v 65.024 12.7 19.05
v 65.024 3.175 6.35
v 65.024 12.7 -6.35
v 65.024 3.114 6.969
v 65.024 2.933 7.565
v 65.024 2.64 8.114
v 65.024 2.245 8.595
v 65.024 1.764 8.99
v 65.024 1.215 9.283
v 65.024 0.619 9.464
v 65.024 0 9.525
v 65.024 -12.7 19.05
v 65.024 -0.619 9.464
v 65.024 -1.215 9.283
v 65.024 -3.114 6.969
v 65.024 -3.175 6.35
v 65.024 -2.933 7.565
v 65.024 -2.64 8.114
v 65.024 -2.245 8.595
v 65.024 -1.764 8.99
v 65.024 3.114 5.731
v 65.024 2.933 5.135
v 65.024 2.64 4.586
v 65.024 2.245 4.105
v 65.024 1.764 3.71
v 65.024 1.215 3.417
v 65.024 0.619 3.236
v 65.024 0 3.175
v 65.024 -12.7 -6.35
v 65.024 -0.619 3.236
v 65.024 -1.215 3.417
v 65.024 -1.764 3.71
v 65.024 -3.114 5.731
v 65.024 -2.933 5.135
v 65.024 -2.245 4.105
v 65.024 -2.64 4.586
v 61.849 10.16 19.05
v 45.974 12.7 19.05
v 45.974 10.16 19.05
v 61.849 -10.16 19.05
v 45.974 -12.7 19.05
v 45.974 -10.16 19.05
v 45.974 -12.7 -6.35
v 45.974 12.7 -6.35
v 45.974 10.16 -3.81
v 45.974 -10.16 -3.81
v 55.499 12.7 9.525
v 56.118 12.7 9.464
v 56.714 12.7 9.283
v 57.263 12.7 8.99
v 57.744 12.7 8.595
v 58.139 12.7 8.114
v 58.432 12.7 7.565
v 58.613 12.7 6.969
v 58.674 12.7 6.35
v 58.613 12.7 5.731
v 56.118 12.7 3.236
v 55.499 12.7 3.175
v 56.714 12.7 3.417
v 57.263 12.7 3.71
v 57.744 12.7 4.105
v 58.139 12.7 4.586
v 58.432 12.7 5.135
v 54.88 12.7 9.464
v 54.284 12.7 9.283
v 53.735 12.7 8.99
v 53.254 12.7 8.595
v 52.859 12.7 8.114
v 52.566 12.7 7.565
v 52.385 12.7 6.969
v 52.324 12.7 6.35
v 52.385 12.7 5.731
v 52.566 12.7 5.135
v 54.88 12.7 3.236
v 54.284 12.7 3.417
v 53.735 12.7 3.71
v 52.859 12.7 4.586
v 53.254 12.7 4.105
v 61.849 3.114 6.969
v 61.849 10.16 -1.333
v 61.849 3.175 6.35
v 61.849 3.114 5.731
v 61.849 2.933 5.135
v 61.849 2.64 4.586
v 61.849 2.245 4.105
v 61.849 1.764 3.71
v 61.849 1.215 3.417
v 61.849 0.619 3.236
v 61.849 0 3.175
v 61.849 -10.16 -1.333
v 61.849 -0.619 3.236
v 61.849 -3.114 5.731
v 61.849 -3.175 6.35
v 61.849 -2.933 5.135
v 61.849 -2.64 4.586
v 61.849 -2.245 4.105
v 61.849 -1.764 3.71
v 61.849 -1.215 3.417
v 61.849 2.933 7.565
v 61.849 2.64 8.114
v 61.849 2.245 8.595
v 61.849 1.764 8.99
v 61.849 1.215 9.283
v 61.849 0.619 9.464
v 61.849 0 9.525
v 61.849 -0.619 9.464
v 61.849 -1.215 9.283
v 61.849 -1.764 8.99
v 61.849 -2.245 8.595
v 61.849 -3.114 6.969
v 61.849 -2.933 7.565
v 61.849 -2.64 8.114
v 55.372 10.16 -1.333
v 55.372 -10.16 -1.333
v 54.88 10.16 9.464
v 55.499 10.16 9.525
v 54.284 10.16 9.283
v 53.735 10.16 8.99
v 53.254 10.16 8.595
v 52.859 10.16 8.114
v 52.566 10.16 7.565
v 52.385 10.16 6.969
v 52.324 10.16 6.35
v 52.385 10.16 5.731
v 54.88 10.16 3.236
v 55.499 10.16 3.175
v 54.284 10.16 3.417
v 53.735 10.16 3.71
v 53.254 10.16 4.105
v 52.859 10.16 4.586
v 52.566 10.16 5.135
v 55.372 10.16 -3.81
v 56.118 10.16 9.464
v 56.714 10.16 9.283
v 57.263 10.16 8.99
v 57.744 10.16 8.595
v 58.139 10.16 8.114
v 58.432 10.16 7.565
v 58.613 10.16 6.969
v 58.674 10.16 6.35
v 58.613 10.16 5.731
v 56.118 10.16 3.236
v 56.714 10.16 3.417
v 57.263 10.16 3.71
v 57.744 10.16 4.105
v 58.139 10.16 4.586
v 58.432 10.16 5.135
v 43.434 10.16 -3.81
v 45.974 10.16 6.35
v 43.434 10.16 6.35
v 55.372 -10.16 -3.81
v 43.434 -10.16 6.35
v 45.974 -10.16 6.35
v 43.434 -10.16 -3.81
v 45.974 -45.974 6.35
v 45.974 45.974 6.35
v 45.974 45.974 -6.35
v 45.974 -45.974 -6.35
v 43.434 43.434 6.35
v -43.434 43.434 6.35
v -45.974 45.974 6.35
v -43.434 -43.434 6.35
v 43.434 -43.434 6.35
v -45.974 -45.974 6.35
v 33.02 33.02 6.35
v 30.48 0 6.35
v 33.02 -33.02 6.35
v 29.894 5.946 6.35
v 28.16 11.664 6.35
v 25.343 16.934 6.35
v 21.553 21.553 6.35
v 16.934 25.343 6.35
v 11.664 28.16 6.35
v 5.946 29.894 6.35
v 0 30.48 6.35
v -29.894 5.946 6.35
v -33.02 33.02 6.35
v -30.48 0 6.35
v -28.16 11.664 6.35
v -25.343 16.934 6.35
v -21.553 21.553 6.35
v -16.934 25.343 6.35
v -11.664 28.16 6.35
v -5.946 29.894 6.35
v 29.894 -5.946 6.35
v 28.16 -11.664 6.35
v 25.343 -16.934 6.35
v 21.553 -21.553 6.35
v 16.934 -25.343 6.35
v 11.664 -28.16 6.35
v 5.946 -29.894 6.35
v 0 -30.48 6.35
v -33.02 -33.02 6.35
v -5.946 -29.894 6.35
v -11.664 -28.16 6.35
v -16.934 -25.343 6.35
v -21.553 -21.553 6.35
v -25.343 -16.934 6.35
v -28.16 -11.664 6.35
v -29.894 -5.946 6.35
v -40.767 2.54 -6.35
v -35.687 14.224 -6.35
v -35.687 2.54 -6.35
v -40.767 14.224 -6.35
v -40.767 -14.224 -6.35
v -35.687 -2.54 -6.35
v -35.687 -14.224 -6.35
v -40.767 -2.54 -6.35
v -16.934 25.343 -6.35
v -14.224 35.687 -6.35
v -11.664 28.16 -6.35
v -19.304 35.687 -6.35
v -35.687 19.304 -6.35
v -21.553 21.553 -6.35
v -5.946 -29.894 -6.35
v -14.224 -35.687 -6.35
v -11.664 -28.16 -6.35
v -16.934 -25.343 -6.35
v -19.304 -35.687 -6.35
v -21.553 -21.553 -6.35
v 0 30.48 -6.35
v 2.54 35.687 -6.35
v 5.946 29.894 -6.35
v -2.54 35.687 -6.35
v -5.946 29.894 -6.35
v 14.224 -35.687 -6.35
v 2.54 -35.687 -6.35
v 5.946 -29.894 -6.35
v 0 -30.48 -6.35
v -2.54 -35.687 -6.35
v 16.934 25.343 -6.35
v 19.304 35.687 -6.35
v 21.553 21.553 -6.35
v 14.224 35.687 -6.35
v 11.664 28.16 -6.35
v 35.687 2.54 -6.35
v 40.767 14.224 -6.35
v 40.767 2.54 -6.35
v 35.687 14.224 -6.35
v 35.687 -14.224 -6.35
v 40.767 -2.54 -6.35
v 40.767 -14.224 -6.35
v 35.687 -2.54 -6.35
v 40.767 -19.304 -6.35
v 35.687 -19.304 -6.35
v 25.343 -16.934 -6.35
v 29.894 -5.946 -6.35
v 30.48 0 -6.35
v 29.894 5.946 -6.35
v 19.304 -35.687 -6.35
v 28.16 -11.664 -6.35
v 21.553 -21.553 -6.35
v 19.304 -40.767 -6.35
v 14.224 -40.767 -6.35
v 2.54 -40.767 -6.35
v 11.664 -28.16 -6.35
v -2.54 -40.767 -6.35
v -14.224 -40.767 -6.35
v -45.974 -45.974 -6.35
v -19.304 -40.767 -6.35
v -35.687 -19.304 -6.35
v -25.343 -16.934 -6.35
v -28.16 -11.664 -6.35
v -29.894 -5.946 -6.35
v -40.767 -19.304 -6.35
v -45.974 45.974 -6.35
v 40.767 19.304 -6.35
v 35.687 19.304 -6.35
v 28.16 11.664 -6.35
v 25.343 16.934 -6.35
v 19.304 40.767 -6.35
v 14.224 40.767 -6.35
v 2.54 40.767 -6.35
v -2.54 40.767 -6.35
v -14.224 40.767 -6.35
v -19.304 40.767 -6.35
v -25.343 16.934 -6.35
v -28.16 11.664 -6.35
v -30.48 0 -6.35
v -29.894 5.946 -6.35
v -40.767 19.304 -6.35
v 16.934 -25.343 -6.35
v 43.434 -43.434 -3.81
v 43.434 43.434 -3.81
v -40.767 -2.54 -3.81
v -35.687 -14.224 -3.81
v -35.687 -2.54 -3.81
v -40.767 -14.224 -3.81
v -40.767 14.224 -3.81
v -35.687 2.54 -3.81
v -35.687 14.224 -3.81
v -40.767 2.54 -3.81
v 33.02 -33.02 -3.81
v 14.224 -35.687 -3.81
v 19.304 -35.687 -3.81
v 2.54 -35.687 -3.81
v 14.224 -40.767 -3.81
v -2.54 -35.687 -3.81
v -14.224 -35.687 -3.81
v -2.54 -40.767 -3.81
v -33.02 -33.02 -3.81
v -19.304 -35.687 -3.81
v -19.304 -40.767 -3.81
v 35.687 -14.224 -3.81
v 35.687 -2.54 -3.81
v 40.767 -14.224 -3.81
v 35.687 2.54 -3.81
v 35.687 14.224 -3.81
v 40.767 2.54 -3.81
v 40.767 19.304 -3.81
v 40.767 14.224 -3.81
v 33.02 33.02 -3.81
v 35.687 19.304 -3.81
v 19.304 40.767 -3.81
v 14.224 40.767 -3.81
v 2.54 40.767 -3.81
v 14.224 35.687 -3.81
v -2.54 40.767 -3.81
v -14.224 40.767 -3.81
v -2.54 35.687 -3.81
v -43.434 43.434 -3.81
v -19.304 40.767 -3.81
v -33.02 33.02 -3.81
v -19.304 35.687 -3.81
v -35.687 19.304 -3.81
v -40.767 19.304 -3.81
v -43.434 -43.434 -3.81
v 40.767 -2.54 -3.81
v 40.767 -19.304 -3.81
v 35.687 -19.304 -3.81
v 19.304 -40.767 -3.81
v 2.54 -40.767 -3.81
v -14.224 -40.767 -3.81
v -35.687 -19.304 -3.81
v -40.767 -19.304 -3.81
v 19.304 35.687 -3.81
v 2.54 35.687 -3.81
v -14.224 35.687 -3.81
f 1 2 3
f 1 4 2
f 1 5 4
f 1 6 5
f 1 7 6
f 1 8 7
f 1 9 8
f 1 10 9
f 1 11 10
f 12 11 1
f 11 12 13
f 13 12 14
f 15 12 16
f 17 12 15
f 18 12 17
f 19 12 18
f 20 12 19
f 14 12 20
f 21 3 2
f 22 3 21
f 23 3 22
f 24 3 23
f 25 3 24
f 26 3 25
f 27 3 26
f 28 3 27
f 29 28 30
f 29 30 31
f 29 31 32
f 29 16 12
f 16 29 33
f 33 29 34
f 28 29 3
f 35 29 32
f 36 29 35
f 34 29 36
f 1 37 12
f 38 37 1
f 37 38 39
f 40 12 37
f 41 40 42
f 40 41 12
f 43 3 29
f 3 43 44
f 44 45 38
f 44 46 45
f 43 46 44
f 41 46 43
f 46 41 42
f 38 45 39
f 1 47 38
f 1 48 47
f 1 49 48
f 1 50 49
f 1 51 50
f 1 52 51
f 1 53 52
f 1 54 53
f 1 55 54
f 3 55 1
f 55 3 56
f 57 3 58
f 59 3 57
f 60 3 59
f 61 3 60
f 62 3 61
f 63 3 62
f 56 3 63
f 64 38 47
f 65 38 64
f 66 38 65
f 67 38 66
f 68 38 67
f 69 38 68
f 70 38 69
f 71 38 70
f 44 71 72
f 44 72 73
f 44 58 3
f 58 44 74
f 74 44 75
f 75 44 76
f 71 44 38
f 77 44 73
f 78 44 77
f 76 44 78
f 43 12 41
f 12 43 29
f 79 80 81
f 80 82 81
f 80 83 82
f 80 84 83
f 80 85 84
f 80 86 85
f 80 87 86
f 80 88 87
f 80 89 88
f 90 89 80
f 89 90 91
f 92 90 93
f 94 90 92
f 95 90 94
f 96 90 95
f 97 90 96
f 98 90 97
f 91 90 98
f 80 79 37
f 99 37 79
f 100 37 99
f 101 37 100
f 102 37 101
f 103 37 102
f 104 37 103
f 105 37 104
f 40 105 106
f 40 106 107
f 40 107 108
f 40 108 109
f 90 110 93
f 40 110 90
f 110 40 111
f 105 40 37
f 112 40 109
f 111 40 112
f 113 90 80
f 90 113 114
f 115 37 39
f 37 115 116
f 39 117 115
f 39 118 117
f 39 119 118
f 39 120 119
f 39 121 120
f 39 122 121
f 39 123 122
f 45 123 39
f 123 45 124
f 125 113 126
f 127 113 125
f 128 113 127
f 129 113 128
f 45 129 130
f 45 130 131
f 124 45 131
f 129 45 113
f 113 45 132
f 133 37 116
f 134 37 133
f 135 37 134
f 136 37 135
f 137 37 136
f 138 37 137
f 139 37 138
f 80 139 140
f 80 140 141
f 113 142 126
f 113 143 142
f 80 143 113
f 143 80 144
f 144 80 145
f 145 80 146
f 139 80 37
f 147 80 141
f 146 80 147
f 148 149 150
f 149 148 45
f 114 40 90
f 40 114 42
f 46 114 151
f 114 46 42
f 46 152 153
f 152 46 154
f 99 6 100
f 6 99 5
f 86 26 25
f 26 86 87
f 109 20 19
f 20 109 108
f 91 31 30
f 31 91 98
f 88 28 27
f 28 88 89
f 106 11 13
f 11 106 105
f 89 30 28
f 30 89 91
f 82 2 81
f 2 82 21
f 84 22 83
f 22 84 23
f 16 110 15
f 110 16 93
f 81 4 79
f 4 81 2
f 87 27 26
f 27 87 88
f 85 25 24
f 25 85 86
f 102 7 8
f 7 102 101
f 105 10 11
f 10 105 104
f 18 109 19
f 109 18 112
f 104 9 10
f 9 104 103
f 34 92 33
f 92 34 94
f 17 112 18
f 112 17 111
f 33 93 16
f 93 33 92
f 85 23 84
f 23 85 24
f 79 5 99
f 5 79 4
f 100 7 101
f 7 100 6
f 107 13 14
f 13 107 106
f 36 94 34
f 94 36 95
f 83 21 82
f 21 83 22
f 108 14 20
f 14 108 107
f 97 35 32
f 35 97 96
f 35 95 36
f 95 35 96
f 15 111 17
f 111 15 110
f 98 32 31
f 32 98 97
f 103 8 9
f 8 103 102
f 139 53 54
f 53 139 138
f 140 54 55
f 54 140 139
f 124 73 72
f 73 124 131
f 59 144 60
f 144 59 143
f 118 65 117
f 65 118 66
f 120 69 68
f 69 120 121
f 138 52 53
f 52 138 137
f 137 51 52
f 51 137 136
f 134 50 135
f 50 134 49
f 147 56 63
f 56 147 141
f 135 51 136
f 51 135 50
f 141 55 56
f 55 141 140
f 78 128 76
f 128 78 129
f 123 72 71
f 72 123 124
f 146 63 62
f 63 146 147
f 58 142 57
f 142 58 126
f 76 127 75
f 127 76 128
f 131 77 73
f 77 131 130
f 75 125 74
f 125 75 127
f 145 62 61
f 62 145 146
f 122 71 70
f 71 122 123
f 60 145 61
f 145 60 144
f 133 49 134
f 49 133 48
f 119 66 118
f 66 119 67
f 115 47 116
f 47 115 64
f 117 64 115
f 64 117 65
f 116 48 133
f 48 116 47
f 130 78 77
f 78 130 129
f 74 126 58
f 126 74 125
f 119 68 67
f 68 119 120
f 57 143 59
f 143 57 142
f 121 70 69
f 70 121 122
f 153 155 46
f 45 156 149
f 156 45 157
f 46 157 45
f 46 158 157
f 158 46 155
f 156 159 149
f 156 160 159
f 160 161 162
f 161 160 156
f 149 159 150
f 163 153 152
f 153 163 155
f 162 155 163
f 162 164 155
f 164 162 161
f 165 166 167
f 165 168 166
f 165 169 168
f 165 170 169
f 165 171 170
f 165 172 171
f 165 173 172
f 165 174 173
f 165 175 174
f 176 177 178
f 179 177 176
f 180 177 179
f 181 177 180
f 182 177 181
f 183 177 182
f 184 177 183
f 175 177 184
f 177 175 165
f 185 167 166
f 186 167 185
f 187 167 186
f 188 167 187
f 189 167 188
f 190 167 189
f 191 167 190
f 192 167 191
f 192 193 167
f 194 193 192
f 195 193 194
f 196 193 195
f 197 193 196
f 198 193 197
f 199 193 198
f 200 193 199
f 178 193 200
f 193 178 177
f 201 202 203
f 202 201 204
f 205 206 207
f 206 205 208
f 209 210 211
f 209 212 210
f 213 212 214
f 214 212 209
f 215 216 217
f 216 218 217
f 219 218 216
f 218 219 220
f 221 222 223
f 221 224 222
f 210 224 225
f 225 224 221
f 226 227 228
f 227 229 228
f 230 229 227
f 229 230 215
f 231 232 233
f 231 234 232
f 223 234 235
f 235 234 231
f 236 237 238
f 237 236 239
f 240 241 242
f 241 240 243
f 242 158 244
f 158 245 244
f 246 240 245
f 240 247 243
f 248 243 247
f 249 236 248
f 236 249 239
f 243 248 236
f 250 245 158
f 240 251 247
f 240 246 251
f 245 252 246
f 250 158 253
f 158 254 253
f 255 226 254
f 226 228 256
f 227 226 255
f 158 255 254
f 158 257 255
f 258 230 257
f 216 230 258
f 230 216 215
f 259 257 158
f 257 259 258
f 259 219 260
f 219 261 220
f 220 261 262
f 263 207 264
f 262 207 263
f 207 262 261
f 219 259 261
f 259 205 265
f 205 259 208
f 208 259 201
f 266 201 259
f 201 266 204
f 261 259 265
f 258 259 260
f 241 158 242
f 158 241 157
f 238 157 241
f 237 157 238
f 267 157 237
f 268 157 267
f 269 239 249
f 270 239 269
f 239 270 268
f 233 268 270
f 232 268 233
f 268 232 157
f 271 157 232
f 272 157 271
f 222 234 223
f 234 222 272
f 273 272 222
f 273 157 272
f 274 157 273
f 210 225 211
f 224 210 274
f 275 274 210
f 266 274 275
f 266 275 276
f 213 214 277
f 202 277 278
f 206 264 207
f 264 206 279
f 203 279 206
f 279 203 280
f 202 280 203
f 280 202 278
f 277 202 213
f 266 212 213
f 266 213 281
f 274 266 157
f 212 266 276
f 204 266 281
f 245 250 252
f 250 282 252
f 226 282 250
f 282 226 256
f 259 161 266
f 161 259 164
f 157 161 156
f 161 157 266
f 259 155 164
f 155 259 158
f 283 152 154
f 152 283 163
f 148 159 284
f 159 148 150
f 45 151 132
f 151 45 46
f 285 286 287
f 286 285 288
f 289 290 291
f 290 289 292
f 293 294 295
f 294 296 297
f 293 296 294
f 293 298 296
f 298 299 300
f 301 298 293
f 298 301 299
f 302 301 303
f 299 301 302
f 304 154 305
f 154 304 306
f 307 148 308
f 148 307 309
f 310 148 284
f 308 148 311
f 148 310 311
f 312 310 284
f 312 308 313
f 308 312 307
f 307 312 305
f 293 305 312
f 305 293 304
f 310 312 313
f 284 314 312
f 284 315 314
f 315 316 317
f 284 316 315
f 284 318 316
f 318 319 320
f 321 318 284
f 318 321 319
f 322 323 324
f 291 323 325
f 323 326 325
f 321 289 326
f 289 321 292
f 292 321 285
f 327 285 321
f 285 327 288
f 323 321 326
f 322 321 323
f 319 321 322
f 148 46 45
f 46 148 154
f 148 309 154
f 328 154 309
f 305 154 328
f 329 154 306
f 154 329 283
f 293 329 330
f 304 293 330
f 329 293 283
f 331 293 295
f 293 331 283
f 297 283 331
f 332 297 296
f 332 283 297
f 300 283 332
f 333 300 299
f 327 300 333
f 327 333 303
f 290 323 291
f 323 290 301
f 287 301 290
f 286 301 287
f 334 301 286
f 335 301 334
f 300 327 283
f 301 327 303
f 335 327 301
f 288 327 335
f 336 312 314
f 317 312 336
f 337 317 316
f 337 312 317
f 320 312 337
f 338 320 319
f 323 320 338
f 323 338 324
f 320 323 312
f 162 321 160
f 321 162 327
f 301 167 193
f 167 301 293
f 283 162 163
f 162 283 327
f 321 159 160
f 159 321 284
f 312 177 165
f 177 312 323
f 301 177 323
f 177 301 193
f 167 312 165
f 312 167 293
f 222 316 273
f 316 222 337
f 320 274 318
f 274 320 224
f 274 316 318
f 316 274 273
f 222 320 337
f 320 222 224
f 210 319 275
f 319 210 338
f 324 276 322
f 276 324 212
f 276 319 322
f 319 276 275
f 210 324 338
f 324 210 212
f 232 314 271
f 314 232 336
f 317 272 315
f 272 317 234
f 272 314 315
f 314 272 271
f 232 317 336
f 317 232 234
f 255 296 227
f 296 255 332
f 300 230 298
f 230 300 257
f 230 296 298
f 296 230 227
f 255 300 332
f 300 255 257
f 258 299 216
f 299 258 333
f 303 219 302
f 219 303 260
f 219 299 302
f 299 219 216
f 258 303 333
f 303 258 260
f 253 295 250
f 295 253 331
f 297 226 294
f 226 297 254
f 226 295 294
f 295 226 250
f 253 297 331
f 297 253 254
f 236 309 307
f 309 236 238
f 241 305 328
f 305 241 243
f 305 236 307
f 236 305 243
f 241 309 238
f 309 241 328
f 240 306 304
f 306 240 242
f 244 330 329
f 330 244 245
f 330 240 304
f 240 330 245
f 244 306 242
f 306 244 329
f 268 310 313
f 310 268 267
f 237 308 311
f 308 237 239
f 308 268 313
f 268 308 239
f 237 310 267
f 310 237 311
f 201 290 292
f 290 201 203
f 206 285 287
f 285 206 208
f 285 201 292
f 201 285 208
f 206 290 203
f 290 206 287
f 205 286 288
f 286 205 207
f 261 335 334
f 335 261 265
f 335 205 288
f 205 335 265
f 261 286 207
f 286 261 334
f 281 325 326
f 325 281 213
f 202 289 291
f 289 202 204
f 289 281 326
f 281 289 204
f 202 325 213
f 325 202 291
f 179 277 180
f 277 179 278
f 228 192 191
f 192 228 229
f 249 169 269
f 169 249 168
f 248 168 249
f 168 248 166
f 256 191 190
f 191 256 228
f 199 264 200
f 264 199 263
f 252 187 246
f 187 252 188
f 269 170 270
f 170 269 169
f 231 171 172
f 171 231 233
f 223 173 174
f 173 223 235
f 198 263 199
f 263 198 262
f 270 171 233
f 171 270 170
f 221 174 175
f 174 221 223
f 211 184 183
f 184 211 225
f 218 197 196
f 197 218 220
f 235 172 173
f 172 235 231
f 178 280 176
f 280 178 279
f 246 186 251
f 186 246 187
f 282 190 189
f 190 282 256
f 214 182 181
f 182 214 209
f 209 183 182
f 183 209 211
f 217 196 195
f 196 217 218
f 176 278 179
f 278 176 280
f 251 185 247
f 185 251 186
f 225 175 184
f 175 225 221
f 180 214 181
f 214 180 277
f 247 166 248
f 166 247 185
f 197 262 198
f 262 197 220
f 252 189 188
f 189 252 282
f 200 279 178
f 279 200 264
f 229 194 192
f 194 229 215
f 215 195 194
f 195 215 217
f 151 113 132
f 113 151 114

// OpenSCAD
/*
  Nikon Light Ring
 
  Author: radiogeek381@gmail.com

  A widget that holds four 12V white LED strips on a ring
  that fits around the base of a Nikon binocular microscope
  with a 2.39 inch diameter ring.
*/ 
/*
Copyright (c) 2016, Matthew H. Reilly (kb1vc)
All rights reserved.

Redistribution and use in source and binary forms, with or without
modification, are permitted provided that the following conditions are
met:

    Redistributions of source code must retain the above copyright
    notice, this list of conditions and the following disclaimer.
    Redistributions in binary form must reproduce the above copyright
    notice, this list of conditions and the following disclaimer in
    the documentation and/or other materials provided with the
    distribution.

THIS SOFTWARE IS PROVIDED BY THE COPYRIGHT HOLDERS AND CONTRIBUTORS
"AS IS" AND ANY EXPRESS OR IMPLIED WARRANTIES, INCLUDING, BUT NOT
LIMITED TO, THE IMPLIED WARRANTIES OF MERCHANTABILITY AND FITNESS FOR
A PARTICULAR PURPOSE ARE DISCLAIMED. IN NO EVENT SHALL THE COPYRIGHT
HOLDER OR CONTRIBUTORS BE LIABLE FOR ANY DIRECT, INDIRECT, INCIDENTAL,
SPECIAL, EXEMPLARY, OR CONSEQUENTIAL DAMAGES (INCLUDING, BUT NOT
LIMITED TO, PROCUREMENT OF SUBSTITUTE GOODS OR SERVICES; LOSS OF USE,
DATA, OR PROFITS; OR BUSINESS INTERRUPTION) HOWEVER CAUSED AND ON ANY
THEORY OF LIABILITY, WHETHER IN CONTRACT, STRICT LIABILITY, OR TORT
(INCLUDING NEGLIGENCE OR OTHERWISE) ARISING IN ANY WAY OUT OF THE USE
OF THIS SOFTWARE, EVEN IF ADVISED OF THE POSSIBILITY OF SUCH DAMAGE.
*/


// All dimensions are in inches -- scaling to mm is at the end.

// render round things kinda round
$fn = 32;

// These shouldn't require much.
InnerRingDia = 2.4;  // diameter of hole that fits around the mounting point
StripWidth = 0.41;   // width of the LED strip
LEDWidth = 0.2;      // LEDs are square -- this size
LEDSpace = 0.46;     // space between LEDs
MountThickness = 0.5; // thickness of ring
WallThickness = 0.1;  // how thick is the wall

WireX = 0.125; 
WireY = 0.25; 

SwitchHoleDia = 0.25; 

// Derived from above... don't mess with this.
BoxSize = StripWidth * 2 + InnerRingDia + 4 * WallThickness;
StripLength = BoxSize - 2 * WallThickness;

SwitchWidth = 0.75;
SwitchDepth = 1;
SwitchHeight = 1;


module show_text(string, loc) {
    translate([loc[0], loc[1], loc[2] - Text_Height]) {
        rotate([0,0,90]) {      
            linear_extrude(height=(2 * Text_Height)) {
                scale([0.015, 0.018, 0.15]) {
                    text(text = string, 
                    halign="center", valign="center", 
                    font="DejaVu LGC Sans:style=Bold");
                }
            }
        }
    }
}

module make_block() {
  OuterSquare = InnerRingDia + WallThickness * 8 + StripWidth;
  cube([BoxSize, BoxSize, MountThickness], center=true);
}

module make_centerhole() {
 translate([0, 0, -MountThickness]) {
    cylinder(d=InnerRingDia, h = MountThickness * 2);
  }
}

module make_lamphole(angle, pos) {
    XOffset = LEDWidth + LEDSpace;
    translate(pos) {
        rotate([0, 0, angle]) {
          union() {
            translate([0, 0, -MountThickness * 0.25]) {
              cube([LEDWidth, LEDWidth, MountThickness * 2], center=true);
            }
            translate([-XOffset, 0, -MountThickness * 0.25]) {
              cube([LEDWidth, LEDWidth, MountThickness * 2], center=true);
            }
            translate([XOffset, 0, -MountThickness * 0.25]) {
              cube([LEDWidth, LEDWidth, MountThickness * 2], center=true);
            }
          }
        }
    }
}

module make_lampholes() {
    RadialOffset = InnerRingDia * 0.5 + StripWidth * 0.5 + WallThickness;
    make_lamphole(0, [0, RadialOffset, 0]);
    make_lamphole(0, [0, -RadialOffset, 0]);
    make_lamphole(90, [RadialOffset, 0, 0]);
    make_lamphole(90, [-RadialOffset, 0, 0]);
}

module make_holes() {
    make_centerhole();
    make_lampholes();
}

module make_groove(angle, pos) {
  translate(pos) { 
    rotate([0, 0, angle]) {
      cube([StripLength, StripWidth, MountThickness], center=true);
    }
  }
}

module make_grooves() {
  RadialOffset = StripWidth / 2 + InnerRingDia / 2 + WallThickness; 
  NormalOffset = StripLength / 2;
  make_groove(0, [0, -RadialOffset, WallThickness]);
  make_groove(0, [0, RadialOffset, WallThickness]);
  make_groove(90, [- RadialOffset, 0, WallThickness]);
  make_groove(90, [RadialOffset, 0, WallThickness]);
}


module switch_box() {
    translate([0.5 * (BoxSize + SwitchWidth), 0, 0.5 * (-MountThickness +SwitchHeight)]) {
      difference() {
          cube([SwitchWidth, SwitchDepth, SwitchHeight], center=true);
          translate([- 0.25 * WallThickness, 0, WallThickness]) {
            cube([SwitchWidth - 2 * WallThickness, SwitchDepth - 2 * WallThickness, SwitchHeight - 2 * WallThickness + 0.005], center=true); 
          }
          translate([0.5 * SwitchWidth - 2 * WallThickness, 0, 0]) {
            rotate([0, 90, 0])
              cylinder(d = SwitchHoleDia, h = WallThickness * 4);
          }
          translate([0, 2 * WallThickness + 0.5 * SwitchDepth, 0]) {
            rotate([90, 0, 0])
              cylinder(d = SwitchHoleDia, h = WallThickness * 4);              
          }
    }
  }
}


module switch_box_notch() {
  SWHoleW = SwitchWidth;
  SWHoleD = SwitchDepth - 2 * WallThickness;
  ZOffset = SwitchHeight/2 - MountThickness/2 + WallThickness;
  translate([(BoxSize/2  - 0.005), 0, ZOffset]) {
      cube([SWHoleW, SWHoleD, SwitchHeight], center=true);
  }
}

module NikonLightRing() {
  difference() {
    union() {
      make_block();
      switch_box();
    }
    union() {
      make_grooves();
      make_holes();
      switch_box_notch();
    }
  }
}


scale([25.4,25.4,25.4]) {
    NikonLightRing();
}
